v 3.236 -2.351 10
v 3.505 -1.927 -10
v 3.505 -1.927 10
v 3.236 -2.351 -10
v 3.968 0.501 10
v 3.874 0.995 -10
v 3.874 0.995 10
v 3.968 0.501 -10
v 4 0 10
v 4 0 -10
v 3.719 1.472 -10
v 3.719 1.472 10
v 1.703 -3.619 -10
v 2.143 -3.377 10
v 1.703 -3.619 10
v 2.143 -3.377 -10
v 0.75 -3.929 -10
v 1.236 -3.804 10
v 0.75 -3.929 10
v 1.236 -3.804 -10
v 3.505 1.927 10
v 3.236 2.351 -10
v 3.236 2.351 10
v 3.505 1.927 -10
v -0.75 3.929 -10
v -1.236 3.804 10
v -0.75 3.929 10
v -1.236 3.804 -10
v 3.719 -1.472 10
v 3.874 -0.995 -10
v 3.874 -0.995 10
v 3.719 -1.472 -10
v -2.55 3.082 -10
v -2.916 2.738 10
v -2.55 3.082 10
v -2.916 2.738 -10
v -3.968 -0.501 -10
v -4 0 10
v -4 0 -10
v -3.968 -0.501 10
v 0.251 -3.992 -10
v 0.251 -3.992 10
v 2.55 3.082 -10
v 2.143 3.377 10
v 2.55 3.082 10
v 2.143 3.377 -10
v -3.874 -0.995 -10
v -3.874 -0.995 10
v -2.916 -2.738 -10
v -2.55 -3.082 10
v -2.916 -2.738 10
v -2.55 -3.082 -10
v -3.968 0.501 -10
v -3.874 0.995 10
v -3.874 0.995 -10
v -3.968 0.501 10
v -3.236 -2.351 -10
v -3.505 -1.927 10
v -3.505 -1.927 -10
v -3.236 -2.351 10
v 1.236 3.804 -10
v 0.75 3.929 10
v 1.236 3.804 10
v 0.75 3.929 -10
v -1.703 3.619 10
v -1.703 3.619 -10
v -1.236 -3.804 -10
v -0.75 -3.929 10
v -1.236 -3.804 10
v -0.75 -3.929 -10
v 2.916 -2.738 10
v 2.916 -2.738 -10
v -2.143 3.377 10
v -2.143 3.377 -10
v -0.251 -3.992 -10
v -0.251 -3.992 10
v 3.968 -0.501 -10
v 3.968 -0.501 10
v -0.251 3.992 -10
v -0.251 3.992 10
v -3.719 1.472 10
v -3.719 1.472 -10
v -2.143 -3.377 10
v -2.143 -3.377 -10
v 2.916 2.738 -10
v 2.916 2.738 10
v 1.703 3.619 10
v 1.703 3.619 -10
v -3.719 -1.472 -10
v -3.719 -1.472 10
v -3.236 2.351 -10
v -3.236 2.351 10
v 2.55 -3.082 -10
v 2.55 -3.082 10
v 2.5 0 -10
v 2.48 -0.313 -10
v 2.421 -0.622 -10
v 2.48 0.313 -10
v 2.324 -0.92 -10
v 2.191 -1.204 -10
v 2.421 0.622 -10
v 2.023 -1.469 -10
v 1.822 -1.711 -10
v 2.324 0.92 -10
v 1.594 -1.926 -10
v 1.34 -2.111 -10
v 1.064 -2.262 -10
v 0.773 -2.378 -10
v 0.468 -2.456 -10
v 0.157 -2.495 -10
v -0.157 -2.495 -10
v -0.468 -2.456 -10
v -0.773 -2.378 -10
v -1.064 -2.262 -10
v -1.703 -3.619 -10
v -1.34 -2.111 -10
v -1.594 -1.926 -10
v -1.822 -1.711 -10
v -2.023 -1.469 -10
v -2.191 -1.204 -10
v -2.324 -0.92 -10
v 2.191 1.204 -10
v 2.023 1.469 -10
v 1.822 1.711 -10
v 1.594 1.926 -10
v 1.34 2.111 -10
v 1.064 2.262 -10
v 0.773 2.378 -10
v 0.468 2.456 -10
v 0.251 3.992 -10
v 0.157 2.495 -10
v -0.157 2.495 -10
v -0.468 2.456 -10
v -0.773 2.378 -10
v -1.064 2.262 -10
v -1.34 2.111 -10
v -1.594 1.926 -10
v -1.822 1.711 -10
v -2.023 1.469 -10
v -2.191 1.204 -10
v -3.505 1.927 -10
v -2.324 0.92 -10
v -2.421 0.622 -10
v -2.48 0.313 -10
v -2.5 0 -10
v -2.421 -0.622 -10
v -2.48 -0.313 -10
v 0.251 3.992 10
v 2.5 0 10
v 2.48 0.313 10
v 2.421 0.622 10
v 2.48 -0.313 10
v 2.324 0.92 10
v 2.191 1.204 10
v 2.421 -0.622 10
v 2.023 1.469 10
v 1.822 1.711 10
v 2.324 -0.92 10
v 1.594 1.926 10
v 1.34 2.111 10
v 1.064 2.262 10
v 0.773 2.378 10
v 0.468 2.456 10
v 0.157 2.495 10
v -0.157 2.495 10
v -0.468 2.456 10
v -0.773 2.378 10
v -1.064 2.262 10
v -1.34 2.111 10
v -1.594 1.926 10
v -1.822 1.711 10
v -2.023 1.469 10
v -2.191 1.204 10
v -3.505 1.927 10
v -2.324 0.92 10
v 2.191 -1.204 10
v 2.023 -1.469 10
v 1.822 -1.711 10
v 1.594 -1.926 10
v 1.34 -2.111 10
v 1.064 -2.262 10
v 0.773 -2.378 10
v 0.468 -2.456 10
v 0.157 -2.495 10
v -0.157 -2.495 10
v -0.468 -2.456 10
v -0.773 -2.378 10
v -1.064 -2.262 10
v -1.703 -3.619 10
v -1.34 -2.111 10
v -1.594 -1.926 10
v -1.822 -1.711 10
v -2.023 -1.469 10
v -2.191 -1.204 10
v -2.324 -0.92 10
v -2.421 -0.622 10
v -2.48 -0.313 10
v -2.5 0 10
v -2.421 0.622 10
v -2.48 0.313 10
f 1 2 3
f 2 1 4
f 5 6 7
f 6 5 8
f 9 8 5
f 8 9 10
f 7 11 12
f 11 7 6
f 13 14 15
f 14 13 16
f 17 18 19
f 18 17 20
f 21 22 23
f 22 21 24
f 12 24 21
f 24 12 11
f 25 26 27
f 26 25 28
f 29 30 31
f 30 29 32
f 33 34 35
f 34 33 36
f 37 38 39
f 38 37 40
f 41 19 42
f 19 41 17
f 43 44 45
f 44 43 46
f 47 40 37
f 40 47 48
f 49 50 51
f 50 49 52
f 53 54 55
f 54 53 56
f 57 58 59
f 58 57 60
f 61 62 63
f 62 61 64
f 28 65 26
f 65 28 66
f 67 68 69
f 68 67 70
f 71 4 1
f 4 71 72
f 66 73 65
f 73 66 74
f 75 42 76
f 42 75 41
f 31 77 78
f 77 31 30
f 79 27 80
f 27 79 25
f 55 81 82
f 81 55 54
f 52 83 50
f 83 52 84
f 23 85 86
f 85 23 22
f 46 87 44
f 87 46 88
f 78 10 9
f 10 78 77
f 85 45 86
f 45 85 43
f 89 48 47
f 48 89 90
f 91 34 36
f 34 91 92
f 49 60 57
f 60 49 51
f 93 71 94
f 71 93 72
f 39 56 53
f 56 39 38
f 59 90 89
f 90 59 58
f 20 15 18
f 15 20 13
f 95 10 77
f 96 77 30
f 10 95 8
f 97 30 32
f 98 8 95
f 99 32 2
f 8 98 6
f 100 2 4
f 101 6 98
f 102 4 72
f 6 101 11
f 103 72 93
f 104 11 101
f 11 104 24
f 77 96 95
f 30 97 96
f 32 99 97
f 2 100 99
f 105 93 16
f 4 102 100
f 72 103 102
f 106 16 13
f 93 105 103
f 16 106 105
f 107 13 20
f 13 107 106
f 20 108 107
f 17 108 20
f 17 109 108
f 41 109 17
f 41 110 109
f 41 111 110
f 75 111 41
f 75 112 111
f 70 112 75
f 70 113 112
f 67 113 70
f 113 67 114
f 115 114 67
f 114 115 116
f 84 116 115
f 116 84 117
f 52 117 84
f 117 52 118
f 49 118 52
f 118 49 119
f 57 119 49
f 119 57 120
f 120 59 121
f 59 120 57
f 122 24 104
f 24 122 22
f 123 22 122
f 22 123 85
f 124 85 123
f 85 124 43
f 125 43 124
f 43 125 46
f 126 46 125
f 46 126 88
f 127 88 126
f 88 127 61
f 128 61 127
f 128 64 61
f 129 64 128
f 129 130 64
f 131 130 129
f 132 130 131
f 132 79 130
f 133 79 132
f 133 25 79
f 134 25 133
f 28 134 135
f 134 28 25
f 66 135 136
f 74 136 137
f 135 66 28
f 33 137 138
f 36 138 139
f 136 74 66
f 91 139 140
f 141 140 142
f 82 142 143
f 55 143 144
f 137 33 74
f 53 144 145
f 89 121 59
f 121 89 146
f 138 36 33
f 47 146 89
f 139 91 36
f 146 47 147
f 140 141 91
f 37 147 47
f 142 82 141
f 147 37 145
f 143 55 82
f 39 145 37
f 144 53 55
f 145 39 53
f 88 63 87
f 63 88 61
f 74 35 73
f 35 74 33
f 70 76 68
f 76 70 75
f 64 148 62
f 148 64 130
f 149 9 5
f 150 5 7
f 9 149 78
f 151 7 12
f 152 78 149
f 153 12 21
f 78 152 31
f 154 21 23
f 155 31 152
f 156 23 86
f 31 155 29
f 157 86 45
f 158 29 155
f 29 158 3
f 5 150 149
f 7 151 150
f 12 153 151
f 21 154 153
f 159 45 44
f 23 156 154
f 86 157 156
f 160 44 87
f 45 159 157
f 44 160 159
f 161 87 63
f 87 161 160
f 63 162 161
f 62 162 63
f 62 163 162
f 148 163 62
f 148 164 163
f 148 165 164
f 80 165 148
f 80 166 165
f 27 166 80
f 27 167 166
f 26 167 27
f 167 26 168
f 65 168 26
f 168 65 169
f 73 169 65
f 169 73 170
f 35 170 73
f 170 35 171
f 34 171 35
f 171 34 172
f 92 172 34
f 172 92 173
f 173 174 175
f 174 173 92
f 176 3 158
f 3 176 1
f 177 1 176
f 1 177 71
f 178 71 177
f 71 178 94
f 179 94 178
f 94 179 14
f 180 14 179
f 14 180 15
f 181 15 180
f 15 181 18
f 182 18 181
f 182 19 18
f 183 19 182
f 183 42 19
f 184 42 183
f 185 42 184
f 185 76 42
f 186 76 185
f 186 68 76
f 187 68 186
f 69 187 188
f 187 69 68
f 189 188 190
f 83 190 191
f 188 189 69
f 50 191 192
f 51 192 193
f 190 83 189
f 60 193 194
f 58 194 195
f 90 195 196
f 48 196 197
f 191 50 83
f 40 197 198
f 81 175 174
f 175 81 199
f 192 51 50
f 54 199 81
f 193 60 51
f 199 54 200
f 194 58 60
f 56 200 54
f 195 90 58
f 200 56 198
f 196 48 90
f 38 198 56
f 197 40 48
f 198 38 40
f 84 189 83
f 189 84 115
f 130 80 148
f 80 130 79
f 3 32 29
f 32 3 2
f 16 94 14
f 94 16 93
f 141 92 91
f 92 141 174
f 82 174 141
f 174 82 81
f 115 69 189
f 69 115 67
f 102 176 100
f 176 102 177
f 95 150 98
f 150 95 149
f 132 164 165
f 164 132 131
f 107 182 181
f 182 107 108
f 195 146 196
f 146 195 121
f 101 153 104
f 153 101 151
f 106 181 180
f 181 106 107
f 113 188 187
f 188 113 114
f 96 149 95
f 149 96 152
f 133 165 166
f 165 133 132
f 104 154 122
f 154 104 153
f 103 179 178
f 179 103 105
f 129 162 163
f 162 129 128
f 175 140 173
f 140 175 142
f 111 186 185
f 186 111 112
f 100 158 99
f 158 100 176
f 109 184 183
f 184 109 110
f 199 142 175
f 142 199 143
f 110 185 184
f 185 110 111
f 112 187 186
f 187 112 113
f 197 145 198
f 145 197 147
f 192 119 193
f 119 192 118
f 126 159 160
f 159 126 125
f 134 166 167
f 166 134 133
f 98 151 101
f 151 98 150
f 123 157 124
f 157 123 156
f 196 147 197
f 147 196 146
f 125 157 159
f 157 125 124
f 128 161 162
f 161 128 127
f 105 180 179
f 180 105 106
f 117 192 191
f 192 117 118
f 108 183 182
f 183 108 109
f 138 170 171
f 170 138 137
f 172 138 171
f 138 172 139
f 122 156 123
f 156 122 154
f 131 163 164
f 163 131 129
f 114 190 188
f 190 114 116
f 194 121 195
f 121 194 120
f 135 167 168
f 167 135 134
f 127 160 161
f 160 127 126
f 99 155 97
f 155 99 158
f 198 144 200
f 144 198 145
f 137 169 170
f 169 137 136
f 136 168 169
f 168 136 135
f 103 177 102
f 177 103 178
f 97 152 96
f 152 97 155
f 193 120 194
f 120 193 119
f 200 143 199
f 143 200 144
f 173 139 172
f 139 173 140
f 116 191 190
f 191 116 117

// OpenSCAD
$fn = 50;


difference() {
	union() {
		translate(v = [0, 0, -10.0000000000]) {
			cylinder(h = 20, r = 4.0000000000);
		}
	}
	union() {
		translate(v = [0, 0, -100.0000000000]) {
			cylinder(h = 200, r = 2.5000000000);
		}
	}
}
